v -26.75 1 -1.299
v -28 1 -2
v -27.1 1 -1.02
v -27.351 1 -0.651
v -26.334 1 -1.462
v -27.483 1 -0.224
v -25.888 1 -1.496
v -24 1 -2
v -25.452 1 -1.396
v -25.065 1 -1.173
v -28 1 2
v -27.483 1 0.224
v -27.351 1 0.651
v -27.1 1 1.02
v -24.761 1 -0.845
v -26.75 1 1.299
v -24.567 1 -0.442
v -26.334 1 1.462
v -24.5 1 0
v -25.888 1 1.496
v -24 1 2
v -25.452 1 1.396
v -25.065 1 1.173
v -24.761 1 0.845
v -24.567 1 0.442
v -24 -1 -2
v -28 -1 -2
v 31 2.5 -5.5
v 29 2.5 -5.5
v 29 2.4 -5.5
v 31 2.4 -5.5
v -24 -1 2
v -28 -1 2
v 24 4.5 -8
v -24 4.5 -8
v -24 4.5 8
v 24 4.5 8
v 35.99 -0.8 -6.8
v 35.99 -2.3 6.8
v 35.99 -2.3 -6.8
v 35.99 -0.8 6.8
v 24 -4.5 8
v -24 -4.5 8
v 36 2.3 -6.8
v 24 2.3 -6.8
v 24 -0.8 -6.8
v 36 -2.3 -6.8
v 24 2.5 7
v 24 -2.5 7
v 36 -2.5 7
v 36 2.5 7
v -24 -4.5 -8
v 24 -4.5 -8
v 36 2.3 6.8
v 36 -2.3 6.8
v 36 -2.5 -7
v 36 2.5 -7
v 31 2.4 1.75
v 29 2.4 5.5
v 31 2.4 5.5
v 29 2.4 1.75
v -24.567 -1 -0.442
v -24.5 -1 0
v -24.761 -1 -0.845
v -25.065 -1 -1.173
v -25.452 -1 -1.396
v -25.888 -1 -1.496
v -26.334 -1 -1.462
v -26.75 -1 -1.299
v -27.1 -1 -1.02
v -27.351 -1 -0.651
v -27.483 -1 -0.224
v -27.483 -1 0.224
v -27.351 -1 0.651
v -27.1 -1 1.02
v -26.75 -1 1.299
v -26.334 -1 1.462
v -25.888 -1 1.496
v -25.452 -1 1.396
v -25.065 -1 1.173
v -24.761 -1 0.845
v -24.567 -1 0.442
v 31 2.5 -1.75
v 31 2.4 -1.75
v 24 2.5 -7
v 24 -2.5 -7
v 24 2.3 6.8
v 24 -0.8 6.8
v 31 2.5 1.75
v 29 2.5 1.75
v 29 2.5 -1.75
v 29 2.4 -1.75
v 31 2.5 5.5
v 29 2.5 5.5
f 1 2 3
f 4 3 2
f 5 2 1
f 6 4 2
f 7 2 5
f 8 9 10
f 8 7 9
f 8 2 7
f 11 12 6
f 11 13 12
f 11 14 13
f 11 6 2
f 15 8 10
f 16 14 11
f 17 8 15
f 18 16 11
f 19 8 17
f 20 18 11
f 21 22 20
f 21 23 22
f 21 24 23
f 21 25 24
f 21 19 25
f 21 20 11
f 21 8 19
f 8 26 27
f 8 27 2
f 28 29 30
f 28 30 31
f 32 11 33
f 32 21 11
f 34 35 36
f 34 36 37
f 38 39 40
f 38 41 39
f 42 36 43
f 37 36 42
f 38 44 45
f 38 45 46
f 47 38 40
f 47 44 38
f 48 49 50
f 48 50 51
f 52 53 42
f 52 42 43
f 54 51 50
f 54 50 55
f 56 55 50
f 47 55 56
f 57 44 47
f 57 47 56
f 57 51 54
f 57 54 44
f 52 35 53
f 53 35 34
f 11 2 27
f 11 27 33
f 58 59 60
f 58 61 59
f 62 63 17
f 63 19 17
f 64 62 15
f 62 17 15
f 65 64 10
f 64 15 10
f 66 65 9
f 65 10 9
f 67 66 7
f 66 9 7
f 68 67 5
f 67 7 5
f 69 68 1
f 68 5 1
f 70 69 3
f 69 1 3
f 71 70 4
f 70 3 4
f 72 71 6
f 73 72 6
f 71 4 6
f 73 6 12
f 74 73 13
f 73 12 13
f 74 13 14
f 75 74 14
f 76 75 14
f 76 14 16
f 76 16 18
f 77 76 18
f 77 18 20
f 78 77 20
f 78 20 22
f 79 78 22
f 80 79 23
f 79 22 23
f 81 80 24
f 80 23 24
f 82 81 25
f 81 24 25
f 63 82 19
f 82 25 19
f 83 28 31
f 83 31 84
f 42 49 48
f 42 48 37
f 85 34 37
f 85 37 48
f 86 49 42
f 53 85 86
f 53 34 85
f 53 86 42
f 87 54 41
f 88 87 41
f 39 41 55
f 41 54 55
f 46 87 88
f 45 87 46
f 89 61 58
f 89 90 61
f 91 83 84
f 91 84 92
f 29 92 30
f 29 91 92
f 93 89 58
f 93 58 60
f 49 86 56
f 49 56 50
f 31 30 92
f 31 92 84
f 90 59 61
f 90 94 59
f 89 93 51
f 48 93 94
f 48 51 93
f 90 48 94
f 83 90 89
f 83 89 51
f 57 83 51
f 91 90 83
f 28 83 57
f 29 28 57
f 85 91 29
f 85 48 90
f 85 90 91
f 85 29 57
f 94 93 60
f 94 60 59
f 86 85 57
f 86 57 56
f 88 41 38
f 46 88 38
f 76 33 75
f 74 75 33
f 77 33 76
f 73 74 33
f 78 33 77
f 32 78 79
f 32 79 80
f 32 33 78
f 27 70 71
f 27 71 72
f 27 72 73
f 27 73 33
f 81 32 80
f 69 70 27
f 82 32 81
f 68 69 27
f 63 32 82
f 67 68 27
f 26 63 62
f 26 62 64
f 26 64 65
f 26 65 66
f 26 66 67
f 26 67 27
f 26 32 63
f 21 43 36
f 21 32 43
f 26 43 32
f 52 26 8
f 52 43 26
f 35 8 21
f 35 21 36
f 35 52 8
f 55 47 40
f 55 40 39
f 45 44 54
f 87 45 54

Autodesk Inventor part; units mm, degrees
ref_plane "YZ Plane" through (0, 0, 0) normal (1, 0, 0) x (0, 1, 0)
ref_plane "XZ Plane" through (0, 0, 0) normal (0, 1, 0) x (-1, 0, 0)
ref_plane "XY Plane" through (0, 0, 0) normal (0, 0, 1) x (1, 0, 0)
sketch "Sketch1" plane through (0, 0, 0) normal (0, 0, 1) x (1, 0, 0)
  line L0 (0, 6.3) -> (0, -6.3) projected
  line L1 (-33.6012, 0) -> (33.607, 0) projected
  line L2 (-24, 4.5) -> (24, 4.5)
  line L3 (24, 4.5) -> (24, -4.5)
  line L4 (24, -4.5) -> (-24, -4.5)
  line L5 (-24, -4.5) -> (-24, 4.5)
  dimension "d0" = 48
  dimension "d1" = 9
extrude "Legoblokje" add sketch "Sketch1" along normal mid plane 16
sketch "Sketch3" plane through (24, -4.5, 8) normal (1, 0, 0) x (0, 0, -1)
  line L0 (0, 9) -> (0, 0) projected
  line L1 (0, 0) -> (16, 0) projected
  line L2 (16, 0) -> (16, 9) projected
  line L3 (0, 9) -> (16, 9) projected
  line L4 (1, 7) -> (15, 7)
  line L5 (15, 7) -> (15, 2)
  line L6 (15, 2) -> (1, 2)
  line L7 (1, 2) -> (1, 7)
  point P0 (8, 4.5)
  dimension "d28" = 1
  dimension "d29" = 2
  dimension "d30" = 2
  dimension "d31" = 1
  dimension "d67" = 5
extrude "USB" add sketch "Sketch3" along normal blind 12 contours L4 L5 L6 L7
sketch "Sketch4" plane through (36, -4.5, 8) normal (1, 0, 0) x (0, 0, -1)
  line L0 (15, 7) -> (15, 2) projected
  line L1 (1, 7) -> (15, 7) projected
  line L2 (1, 2) -> (1, 7) projected
  line L3 (15, 2) -> (1, 2) projected
  line L4 (1.2, 3.7) -> (14.8, 3.7)
  line L5 (14.8, 3.7) -> (14.8, 2.2)
  line L6 (14.8, 2.2) -> (1.2, 2.2)
  line L7 (1.2, 2.2) -> (1.2, 3.7)
  line L8 (1.2, 3.7) -> (14.8, 3.7)
  line L9 (14.8, 3.7) -> (14.8, 6.8)
  line L10 (14.8, 6.8) -> (1.2, 6.8)
  line L11 (1.2, 6.8) -> (1.2, 3.7)
  point P0 (8, 4.5)
  dimension "d34" = 0.2
  dimension "d35" = 0.2
  dimension "d36" = 0.2
  dimension "d37" = 1.5
  dimension "d38" = 0.2
extrude "Afwerking USB" cut sketch "Sketch4" against normal blind 12 contours L11 L10 L9 L4
sketch "Sketch5" plane through (36, -4.5, 8) normal (1, 0, 0) x (0, 0, -1)
  line L0 (15, 2) -> (1, 2) projected
  line L1 (1.2, 3.7) -> (14.8, 3.7)
  line L2 (14.8, 3.7) -> (14.8, 2.2)
  line L3 (14.8, 2.2) -> (1.2, 2.2)
  line L4 (1.2, 2.2) -> (1.2, 3.7)
  point P0 (8, 4.5)
  dimension "d41" = 0.2
extrude "Afwerking" cut sketch "Sketch5" against normal blind 0.01
sketch "Sketch6" plane through (24, 2.5, 7) normal (0, 1, 0) x (1, 0, 0)
  line L0 (0, 14) -> (12, 14) projected
  line L1 (0, 0) -> (0, 14) projected
  line L2 (0, 0) -> (12, 0) projected
  line L3 (5, 12.5) -> (7, 12.5)
  line L4 (7, 12.5) -> (7, 8.75)
  line L5 (7, 8.75) -> (5, 8.75)
  line L6 (5, 8.75) -> (5, 12.5)
  line L7 (5, 5.25) -> (7, 5.25)
  line L8 (7, 5.25) -> (7, 1.5)
  line L9 (7, 1.5) -> (5, 1.5)
  line L10 (5, 1.5) -> (5, 5.25)
  point P0 (-24, 7)
  dimension "d44" = 5
  dimension "d45" = 5
  dimension "d46" = 1.5
  dimension "d47" = 1.5
  dimension "d48" = 3.5
  dimension "d49" = 2
  dimension "d50" = 2
  dimension "d51" = 3.75
  dimension "d52" = 3.75
extrude "Afwerking bovenkant" cut sketch "Sketch6" against normal blind 0.1
sketch "Sketch7" plane through (-24, -4.5, 8) normal (-1, 0, 0) x (0, 0, 1)
  line L0 (-10, 5.5) -> (-6, 5.5)
  line L1 (-6, 5.5) -> (-6, 3.5)
  line L2 (-6, 3.5) -> (-10, 3.5)
  line L3 (-10, 3.5) -> (-10, 5.5)
  point P0 (-8, 4.5)
  dimension "d55" = 1
  dimension "d56" = 1
  dimension "d57" = 2
  dimension "d58" = 2
extrude "Achterkant afwerking" add sketch "Sketch7" along normal blind 4
sketch "Sketch8" plane through (-24, 1, 2) normal (0, 1, 0) x (1, 0, 0)
  circle A0 centre (-2, 2) radius 1.5
  point P0 (24, 2)
  dimension "d61" = 3
extrude "afwerking gat" cut sketch "Sketch8" against normal through all
properties part number "USB_Stick"
